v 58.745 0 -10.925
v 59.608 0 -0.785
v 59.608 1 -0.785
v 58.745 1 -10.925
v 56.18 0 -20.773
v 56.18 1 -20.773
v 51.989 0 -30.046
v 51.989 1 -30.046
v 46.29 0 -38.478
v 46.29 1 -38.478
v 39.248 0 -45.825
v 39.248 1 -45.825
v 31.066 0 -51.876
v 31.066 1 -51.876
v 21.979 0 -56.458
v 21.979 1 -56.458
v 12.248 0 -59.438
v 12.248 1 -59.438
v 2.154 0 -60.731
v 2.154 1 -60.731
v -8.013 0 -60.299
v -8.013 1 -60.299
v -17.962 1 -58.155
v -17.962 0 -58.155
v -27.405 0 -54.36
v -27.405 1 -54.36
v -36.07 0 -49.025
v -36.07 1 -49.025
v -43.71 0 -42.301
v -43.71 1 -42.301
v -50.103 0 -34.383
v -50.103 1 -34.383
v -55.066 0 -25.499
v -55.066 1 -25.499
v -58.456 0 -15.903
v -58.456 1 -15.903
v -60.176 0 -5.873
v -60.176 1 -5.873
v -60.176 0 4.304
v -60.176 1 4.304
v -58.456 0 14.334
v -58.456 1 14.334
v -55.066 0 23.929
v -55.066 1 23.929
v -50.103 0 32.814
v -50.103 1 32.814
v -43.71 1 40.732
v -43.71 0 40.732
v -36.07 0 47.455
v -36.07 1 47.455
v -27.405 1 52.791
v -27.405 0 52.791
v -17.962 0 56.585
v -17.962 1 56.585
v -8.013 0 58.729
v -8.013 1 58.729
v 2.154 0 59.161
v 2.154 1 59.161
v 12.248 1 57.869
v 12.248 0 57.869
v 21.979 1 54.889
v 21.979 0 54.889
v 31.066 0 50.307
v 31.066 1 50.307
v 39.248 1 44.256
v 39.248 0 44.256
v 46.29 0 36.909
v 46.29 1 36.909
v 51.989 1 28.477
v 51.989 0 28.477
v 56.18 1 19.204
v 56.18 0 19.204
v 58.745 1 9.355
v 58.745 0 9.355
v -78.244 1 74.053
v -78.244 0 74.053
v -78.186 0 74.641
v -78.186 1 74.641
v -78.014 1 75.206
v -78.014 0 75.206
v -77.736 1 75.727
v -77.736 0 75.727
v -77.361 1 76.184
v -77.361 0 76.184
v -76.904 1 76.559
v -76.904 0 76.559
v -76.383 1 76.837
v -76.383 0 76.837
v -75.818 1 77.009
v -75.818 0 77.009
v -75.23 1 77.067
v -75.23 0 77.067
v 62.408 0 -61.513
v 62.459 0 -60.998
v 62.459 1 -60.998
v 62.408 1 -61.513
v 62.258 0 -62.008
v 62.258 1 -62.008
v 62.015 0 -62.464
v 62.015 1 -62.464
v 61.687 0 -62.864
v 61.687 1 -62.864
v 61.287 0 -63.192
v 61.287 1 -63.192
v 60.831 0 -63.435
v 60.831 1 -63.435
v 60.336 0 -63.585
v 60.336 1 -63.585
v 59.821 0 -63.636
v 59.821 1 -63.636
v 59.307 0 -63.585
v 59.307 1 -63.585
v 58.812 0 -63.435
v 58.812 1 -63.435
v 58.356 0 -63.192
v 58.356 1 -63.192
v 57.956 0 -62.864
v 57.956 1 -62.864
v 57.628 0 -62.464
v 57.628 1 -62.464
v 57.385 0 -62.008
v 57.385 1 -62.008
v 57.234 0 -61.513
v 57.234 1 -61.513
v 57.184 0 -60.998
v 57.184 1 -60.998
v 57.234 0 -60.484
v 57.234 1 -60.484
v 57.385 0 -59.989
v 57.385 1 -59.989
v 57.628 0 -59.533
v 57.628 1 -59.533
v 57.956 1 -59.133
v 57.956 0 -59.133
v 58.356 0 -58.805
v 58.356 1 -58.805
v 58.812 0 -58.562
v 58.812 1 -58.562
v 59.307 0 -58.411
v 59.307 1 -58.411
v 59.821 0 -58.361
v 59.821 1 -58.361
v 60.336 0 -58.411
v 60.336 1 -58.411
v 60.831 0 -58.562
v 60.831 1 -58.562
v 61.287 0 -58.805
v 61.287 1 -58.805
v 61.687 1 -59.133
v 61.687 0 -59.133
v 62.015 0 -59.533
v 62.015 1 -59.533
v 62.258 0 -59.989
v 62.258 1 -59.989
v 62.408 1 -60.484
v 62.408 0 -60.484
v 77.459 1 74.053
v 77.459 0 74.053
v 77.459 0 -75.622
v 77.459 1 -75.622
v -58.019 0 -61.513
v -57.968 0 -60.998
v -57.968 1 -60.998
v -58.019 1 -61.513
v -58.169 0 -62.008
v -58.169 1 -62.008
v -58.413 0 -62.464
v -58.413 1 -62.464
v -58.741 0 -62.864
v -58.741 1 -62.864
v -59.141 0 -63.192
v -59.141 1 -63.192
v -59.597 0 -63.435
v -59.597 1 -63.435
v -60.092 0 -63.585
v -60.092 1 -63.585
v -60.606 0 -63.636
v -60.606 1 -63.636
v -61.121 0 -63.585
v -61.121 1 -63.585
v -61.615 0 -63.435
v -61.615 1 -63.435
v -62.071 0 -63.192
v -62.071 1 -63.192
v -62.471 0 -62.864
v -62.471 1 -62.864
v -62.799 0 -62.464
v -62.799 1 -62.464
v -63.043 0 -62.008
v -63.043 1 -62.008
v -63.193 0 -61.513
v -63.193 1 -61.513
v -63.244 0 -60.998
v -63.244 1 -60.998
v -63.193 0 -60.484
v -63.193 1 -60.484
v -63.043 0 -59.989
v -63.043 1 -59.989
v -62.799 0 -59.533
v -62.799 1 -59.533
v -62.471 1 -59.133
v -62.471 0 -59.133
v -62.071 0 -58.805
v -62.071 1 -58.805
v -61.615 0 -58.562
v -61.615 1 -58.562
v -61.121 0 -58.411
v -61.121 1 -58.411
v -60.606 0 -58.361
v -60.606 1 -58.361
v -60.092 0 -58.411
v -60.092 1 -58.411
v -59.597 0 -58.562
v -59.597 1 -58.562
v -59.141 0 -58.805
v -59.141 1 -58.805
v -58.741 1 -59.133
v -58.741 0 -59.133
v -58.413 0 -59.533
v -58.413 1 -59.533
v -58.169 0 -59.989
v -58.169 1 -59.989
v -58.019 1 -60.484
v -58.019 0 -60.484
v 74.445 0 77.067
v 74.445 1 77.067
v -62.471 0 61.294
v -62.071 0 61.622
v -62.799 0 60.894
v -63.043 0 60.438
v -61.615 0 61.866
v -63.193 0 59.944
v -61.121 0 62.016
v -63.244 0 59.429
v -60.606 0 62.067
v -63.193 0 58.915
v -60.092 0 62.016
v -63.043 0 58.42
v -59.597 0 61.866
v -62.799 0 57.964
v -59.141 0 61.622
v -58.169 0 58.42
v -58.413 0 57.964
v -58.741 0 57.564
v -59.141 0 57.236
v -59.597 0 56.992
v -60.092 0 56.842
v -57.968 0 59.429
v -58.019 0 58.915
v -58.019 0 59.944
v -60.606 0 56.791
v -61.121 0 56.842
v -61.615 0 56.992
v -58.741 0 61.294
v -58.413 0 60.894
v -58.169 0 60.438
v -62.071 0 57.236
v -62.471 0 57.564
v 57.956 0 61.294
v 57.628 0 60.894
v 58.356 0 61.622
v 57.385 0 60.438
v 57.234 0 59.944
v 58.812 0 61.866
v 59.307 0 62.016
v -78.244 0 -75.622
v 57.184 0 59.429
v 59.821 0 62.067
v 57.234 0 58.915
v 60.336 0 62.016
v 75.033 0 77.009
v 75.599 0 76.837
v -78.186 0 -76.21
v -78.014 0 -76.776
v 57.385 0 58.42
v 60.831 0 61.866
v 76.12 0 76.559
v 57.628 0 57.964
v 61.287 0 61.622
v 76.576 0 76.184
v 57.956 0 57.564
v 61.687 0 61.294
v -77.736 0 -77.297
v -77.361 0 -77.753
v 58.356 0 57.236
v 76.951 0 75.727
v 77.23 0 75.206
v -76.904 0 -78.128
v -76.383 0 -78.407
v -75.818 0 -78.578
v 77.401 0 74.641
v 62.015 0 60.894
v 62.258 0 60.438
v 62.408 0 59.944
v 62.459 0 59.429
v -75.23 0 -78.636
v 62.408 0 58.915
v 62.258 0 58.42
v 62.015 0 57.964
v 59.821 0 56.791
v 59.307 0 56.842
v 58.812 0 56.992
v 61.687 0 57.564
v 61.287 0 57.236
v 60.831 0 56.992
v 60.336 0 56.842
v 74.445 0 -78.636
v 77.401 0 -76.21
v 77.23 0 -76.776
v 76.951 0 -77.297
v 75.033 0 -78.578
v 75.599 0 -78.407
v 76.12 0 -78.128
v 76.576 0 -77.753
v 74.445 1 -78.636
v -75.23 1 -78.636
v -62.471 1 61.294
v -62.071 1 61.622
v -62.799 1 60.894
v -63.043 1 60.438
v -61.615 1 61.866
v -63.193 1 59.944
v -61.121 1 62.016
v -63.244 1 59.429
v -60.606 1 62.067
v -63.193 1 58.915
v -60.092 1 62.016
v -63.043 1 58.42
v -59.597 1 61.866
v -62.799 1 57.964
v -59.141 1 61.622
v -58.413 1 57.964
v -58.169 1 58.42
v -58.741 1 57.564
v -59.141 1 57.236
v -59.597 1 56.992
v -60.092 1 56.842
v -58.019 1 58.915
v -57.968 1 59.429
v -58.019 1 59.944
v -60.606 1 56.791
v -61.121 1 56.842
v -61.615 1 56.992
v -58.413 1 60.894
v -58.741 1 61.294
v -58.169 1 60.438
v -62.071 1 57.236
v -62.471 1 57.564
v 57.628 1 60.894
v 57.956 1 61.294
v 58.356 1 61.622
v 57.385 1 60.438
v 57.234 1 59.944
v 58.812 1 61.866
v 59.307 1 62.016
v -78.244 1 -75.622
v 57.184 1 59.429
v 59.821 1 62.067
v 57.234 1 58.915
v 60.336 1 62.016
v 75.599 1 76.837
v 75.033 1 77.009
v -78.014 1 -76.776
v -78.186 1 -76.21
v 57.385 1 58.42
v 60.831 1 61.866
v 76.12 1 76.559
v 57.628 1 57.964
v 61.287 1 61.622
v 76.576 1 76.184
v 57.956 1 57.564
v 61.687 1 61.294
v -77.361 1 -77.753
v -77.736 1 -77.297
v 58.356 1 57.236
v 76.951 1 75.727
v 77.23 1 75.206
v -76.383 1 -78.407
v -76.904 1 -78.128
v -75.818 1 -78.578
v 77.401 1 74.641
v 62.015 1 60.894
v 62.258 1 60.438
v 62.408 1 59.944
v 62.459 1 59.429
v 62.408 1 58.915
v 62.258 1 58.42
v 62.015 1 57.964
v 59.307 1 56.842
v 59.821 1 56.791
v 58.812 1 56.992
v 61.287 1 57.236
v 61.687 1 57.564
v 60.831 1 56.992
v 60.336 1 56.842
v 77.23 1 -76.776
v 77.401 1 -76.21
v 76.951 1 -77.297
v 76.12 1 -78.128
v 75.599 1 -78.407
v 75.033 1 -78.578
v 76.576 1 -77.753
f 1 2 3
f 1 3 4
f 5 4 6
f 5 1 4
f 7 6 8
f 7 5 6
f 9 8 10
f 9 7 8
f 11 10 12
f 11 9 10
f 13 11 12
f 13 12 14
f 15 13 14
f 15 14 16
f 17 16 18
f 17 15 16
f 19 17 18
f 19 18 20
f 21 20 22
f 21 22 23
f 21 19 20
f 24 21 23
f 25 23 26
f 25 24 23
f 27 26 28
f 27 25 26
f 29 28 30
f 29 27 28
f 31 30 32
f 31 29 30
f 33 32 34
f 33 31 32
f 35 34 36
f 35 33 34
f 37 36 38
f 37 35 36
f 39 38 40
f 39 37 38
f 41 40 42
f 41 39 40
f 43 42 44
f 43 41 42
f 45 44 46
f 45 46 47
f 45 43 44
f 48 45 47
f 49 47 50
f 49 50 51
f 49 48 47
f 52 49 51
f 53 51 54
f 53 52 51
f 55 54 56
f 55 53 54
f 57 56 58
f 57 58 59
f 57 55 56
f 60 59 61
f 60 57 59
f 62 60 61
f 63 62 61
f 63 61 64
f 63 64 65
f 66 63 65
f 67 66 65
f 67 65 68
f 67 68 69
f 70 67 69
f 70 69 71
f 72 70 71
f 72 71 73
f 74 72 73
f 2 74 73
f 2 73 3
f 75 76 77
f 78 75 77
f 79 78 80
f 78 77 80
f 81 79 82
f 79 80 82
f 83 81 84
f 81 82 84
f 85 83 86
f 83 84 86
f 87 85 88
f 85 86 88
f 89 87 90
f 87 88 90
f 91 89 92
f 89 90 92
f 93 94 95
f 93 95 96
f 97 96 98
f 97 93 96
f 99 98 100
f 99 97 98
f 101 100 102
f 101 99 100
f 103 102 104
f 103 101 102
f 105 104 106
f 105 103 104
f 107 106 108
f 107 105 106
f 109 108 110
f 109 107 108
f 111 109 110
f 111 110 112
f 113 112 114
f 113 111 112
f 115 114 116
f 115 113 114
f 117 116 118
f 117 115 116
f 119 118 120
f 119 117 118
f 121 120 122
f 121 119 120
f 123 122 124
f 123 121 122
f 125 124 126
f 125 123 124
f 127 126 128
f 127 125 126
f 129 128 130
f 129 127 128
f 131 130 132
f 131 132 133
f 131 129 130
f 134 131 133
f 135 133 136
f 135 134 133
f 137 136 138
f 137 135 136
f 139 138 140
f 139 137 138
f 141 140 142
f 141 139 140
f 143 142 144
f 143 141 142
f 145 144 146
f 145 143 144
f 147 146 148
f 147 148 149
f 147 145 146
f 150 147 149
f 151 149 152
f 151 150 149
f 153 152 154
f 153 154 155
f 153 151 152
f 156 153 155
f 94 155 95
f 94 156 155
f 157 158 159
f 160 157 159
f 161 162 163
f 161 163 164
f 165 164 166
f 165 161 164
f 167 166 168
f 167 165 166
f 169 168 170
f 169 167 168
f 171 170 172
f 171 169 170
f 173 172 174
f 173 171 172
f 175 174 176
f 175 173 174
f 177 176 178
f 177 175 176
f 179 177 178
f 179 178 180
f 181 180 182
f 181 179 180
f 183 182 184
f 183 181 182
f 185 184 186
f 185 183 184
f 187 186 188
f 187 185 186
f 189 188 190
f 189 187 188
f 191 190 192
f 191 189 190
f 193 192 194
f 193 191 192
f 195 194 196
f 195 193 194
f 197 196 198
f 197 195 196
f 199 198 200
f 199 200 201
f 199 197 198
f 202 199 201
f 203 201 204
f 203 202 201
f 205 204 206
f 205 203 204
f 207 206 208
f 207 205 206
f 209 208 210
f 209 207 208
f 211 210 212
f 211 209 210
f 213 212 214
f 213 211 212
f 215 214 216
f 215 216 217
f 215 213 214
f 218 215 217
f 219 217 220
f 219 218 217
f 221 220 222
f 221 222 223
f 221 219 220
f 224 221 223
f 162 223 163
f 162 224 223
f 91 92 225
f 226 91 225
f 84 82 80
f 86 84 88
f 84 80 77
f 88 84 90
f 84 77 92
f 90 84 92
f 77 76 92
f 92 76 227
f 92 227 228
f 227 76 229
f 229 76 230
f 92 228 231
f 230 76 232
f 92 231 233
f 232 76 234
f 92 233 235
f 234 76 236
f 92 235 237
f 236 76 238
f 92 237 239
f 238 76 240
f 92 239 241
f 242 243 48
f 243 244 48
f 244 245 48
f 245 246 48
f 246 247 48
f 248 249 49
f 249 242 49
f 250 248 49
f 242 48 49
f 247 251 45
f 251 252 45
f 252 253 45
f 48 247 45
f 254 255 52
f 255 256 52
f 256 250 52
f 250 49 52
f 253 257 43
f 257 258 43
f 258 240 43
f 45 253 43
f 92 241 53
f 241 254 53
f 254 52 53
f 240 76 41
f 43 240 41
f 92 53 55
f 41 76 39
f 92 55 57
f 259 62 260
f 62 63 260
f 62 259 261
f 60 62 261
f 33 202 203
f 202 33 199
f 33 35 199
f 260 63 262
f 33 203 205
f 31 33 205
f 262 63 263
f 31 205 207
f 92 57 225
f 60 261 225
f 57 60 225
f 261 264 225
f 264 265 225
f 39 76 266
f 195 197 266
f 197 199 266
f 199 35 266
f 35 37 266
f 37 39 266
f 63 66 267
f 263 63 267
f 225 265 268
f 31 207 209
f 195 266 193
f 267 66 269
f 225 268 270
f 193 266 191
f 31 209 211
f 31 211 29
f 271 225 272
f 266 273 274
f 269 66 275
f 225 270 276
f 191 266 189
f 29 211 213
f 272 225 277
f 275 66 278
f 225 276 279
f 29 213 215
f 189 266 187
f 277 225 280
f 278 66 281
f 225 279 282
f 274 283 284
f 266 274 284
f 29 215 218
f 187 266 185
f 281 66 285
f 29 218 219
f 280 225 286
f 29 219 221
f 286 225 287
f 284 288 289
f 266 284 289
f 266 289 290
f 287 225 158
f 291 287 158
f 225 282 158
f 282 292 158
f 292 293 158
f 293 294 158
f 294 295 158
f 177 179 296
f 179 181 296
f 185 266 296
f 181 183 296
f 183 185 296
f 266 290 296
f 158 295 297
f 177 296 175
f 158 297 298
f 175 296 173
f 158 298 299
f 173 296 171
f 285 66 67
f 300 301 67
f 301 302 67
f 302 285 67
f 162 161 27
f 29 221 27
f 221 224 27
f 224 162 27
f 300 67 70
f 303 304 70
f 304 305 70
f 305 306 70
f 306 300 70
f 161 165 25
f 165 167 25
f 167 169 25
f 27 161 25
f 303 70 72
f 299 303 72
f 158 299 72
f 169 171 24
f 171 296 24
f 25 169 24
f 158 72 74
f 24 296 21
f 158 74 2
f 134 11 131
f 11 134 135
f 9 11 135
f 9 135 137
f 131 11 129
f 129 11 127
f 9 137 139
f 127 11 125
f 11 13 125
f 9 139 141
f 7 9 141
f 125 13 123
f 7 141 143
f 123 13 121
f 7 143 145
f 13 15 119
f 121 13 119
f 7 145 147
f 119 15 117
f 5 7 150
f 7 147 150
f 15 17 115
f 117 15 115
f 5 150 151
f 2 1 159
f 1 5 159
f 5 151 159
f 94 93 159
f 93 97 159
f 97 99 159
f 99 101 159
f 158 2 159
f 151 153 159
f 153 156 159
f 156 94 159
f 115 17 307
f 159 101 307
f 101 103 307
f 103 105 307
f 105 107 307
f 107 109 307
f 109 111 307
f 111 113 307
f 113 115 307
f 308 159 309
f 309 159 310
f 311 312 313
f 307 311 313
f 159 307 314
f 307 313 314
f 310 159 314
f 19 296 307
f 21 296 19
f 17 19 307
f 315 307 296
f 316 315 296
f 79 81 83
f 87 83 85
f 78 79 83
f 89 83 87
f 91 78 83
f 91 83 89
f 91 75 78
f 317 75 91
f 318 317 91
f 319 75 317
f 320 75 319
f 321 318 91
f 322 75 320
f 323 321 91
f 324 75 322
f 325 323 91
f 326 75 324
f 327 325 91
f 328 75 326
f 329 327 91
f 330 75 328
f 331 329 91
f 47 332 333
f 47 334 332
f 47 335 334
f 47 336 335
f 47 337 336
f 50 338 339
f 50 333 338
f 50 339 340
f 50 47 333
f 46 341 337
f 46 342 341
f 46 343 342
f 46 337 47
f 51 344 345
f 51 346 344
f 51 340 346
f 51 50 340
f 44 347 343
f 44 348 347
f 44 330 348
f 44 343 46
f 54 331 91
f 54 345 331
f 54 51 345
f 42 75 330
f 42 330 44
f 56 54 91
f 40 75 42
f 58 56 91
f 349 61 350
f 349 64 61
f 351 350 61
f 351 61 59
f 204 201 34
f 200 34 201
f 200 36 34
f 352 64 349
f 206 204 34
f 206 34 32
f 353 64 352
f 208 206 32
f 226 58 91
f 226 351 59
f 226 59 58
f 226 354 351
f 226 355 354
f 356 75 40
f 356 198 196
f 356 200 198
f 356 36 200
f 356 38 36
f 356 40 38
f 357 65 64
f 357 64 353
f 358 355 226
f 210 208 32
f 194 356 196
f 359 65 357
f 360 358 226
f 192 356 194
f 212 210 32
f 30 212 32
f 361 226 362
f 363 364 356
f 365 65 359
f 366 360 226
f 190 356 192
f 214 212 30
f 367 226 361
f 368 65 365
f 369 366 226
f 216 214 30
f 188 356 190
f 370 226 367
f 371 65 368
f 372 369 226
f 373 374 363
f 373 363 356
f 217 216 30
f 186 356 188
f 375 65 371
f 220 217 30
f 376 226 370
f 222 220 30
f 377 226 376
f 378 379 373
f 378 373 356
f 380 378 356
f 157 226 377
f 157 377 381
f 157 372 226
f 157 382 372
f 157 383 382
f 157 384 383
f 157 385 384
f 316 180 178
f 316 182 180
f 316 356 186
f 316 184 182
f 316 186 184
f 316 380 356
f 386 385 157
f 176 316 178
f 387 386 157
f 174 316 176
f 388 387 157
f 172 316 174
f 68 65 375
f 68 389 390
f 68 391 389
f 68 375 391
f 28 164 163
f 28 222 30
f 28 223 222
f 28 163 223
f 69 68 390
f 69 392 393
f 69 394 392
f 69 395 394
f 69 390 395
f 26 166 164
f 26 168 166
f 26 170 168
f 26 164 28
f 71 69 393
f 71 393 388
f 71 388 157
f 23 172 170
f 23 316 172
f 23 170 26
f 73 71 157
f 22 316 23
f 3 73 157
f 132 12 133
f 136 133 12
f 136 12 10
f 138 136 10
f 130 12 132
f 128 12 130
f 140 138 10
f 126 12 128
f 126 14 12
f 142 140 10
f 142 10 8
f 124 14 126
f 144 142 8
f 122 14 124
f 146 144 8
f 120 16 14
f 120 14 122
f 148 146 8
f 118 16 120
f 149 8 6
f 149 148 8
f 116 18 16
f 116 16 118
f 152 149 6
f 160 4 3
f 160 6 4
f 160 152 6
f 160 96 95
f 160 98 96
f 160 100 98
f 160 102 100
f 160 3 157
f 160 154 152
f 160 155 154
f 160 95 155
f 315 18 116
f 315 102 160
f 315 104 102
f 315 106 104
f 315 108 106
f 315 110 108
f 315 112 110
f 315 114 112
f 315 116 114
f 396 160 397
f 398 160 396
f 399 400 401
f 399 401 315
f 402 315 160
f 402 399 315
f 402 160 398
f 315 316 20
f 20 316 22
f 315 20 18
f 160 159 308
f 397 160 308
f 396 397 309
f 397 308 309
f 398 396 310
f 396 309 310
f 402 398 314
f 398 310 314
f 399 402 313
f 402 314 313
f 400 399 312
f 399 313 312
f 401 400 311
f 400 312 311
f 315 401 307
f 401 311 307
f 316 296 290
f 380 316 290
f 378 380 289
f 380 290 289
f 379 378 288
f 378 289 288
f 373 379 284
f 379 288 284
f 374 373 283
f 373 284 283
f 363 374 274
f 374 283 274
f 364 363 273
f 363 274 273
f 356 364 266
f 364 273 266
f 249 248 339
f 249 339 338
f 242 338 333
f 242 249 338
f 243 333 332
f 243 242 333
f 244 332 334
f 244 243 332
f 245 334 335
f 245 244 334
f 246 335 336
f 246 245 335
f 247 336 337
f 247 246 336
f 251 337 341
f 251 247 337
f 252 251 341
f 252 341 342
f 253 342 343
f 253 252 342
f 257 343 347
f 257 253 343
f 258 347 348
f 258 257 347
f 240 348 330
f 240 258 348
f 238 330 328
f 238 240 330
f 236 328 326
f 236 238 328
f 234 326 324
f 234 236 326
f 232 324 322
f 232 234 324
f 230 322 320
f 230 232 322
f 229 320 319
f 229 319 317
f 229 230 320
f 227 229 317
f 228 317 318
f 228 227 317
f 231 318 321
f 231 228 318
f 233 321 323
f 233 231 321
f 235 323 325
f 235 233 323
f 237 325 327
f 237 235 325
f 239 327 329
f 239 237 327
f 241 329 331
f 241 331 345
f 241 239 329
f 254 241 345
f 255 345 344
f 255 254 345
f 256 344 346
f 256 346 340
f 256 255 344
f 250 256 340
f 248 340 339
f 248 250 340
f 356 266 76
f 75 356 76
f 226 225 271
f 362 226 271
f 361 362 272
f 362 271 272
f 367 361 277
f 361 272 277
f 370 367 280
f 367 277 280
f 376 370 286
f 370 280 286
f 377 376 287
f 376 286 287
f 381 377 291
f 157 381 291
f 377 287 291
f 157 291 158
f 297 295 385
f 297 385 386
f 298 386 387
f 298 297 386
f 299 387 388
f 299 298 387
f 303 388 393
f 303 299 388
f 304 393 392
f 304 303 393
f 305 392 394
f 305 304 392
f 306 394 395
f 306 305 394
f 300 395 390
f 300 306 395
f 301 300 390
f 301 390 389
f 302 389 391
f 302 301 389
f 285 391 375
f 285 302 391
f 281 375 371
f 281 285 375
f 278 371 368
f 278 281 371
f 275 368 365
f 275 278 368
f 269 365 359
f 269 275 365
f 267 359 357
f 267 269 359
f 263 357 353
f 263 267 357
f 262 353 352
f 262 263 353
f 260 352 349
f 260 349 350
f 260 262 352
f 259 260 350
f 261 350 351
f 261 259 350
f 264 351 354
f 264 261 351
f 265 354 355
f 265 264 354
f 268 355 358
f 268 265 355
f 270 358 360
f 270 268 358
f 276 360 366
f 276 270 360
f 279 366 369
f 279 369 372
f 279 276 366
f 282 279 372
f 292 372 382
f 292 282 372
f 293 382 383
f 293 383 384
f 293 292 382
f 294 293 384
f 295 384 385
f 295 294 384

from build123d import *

# Parameters (mm, degrees)
SKETCH1_R           = 60
SKETCH1_R_2         = 2.637642313
BOSS_EXTRUDE1_DEPTH = 1


with BuildPart() as part:
    # Sketch1 → Boss-Extrude1 (new body)
    with BuildSketch(Plane(origin=(0, 0, 0), x_dir=(1, 0, 0), z_dir=(0, 1, 0))):
        with BuildLine():
            Line((77.459067431, -74.053128544), (77.459067431, 75.622473214))
            ThreePointArc((77.459067431, 75.622473214), (76.57640363, 77.753412133), (74.445464711, 78.636075934))
            Line((74.445464711, 78.636075934), (-75.230137046, 78.636075934))
            ThreePointArc((-75.230137046, 78.636075934), (-77.361075965, 77.753412133), (-78.243739766, 75.622473214))
            Line((-78.243739766, 75.622473214), (-78.243739766, -74.053128544))
            ThreePointArc((-78.243739766, -74.053128544), (-77.361075965, -76.184067463), (-75.230137046, -77.066731264))
            Line((-75.230137046, -77.066731264), (74.445464711, -77.066731264))
            ThreePointArc((74.445464711, -77.066731264), (76.57640363, -76.184067463), (77.459067431, -74.053128544))
        make_face()
        with Locations((-0.392336167, 0.784672335)):
            Circle(SKETCH1_R, mode=Mode.SUBTRACT)
        with Locations((-60.606097453, -59.429088951)):
            Circle(SKETCH1_R_2, mode=Mode.SUBTRACT)
        with Locations((-60.606097453, 60.998433621)):
            Circle(SKETCH1_R_2, mode=Mode.SUBTRACT)
        with Locations((59.821425118, -59.429088951)):
            Circle(SKETCH1_R_2, mode=Mode.SUBTRACT)
        with Locations((59.821425118, 60.998433621)):
            Circle(SKETCH1_R_2, mode=Mode.SUBTRACT)
    extrude(amount=BOSS_EXTRUDE1_DEPTH)


solid = part.part
